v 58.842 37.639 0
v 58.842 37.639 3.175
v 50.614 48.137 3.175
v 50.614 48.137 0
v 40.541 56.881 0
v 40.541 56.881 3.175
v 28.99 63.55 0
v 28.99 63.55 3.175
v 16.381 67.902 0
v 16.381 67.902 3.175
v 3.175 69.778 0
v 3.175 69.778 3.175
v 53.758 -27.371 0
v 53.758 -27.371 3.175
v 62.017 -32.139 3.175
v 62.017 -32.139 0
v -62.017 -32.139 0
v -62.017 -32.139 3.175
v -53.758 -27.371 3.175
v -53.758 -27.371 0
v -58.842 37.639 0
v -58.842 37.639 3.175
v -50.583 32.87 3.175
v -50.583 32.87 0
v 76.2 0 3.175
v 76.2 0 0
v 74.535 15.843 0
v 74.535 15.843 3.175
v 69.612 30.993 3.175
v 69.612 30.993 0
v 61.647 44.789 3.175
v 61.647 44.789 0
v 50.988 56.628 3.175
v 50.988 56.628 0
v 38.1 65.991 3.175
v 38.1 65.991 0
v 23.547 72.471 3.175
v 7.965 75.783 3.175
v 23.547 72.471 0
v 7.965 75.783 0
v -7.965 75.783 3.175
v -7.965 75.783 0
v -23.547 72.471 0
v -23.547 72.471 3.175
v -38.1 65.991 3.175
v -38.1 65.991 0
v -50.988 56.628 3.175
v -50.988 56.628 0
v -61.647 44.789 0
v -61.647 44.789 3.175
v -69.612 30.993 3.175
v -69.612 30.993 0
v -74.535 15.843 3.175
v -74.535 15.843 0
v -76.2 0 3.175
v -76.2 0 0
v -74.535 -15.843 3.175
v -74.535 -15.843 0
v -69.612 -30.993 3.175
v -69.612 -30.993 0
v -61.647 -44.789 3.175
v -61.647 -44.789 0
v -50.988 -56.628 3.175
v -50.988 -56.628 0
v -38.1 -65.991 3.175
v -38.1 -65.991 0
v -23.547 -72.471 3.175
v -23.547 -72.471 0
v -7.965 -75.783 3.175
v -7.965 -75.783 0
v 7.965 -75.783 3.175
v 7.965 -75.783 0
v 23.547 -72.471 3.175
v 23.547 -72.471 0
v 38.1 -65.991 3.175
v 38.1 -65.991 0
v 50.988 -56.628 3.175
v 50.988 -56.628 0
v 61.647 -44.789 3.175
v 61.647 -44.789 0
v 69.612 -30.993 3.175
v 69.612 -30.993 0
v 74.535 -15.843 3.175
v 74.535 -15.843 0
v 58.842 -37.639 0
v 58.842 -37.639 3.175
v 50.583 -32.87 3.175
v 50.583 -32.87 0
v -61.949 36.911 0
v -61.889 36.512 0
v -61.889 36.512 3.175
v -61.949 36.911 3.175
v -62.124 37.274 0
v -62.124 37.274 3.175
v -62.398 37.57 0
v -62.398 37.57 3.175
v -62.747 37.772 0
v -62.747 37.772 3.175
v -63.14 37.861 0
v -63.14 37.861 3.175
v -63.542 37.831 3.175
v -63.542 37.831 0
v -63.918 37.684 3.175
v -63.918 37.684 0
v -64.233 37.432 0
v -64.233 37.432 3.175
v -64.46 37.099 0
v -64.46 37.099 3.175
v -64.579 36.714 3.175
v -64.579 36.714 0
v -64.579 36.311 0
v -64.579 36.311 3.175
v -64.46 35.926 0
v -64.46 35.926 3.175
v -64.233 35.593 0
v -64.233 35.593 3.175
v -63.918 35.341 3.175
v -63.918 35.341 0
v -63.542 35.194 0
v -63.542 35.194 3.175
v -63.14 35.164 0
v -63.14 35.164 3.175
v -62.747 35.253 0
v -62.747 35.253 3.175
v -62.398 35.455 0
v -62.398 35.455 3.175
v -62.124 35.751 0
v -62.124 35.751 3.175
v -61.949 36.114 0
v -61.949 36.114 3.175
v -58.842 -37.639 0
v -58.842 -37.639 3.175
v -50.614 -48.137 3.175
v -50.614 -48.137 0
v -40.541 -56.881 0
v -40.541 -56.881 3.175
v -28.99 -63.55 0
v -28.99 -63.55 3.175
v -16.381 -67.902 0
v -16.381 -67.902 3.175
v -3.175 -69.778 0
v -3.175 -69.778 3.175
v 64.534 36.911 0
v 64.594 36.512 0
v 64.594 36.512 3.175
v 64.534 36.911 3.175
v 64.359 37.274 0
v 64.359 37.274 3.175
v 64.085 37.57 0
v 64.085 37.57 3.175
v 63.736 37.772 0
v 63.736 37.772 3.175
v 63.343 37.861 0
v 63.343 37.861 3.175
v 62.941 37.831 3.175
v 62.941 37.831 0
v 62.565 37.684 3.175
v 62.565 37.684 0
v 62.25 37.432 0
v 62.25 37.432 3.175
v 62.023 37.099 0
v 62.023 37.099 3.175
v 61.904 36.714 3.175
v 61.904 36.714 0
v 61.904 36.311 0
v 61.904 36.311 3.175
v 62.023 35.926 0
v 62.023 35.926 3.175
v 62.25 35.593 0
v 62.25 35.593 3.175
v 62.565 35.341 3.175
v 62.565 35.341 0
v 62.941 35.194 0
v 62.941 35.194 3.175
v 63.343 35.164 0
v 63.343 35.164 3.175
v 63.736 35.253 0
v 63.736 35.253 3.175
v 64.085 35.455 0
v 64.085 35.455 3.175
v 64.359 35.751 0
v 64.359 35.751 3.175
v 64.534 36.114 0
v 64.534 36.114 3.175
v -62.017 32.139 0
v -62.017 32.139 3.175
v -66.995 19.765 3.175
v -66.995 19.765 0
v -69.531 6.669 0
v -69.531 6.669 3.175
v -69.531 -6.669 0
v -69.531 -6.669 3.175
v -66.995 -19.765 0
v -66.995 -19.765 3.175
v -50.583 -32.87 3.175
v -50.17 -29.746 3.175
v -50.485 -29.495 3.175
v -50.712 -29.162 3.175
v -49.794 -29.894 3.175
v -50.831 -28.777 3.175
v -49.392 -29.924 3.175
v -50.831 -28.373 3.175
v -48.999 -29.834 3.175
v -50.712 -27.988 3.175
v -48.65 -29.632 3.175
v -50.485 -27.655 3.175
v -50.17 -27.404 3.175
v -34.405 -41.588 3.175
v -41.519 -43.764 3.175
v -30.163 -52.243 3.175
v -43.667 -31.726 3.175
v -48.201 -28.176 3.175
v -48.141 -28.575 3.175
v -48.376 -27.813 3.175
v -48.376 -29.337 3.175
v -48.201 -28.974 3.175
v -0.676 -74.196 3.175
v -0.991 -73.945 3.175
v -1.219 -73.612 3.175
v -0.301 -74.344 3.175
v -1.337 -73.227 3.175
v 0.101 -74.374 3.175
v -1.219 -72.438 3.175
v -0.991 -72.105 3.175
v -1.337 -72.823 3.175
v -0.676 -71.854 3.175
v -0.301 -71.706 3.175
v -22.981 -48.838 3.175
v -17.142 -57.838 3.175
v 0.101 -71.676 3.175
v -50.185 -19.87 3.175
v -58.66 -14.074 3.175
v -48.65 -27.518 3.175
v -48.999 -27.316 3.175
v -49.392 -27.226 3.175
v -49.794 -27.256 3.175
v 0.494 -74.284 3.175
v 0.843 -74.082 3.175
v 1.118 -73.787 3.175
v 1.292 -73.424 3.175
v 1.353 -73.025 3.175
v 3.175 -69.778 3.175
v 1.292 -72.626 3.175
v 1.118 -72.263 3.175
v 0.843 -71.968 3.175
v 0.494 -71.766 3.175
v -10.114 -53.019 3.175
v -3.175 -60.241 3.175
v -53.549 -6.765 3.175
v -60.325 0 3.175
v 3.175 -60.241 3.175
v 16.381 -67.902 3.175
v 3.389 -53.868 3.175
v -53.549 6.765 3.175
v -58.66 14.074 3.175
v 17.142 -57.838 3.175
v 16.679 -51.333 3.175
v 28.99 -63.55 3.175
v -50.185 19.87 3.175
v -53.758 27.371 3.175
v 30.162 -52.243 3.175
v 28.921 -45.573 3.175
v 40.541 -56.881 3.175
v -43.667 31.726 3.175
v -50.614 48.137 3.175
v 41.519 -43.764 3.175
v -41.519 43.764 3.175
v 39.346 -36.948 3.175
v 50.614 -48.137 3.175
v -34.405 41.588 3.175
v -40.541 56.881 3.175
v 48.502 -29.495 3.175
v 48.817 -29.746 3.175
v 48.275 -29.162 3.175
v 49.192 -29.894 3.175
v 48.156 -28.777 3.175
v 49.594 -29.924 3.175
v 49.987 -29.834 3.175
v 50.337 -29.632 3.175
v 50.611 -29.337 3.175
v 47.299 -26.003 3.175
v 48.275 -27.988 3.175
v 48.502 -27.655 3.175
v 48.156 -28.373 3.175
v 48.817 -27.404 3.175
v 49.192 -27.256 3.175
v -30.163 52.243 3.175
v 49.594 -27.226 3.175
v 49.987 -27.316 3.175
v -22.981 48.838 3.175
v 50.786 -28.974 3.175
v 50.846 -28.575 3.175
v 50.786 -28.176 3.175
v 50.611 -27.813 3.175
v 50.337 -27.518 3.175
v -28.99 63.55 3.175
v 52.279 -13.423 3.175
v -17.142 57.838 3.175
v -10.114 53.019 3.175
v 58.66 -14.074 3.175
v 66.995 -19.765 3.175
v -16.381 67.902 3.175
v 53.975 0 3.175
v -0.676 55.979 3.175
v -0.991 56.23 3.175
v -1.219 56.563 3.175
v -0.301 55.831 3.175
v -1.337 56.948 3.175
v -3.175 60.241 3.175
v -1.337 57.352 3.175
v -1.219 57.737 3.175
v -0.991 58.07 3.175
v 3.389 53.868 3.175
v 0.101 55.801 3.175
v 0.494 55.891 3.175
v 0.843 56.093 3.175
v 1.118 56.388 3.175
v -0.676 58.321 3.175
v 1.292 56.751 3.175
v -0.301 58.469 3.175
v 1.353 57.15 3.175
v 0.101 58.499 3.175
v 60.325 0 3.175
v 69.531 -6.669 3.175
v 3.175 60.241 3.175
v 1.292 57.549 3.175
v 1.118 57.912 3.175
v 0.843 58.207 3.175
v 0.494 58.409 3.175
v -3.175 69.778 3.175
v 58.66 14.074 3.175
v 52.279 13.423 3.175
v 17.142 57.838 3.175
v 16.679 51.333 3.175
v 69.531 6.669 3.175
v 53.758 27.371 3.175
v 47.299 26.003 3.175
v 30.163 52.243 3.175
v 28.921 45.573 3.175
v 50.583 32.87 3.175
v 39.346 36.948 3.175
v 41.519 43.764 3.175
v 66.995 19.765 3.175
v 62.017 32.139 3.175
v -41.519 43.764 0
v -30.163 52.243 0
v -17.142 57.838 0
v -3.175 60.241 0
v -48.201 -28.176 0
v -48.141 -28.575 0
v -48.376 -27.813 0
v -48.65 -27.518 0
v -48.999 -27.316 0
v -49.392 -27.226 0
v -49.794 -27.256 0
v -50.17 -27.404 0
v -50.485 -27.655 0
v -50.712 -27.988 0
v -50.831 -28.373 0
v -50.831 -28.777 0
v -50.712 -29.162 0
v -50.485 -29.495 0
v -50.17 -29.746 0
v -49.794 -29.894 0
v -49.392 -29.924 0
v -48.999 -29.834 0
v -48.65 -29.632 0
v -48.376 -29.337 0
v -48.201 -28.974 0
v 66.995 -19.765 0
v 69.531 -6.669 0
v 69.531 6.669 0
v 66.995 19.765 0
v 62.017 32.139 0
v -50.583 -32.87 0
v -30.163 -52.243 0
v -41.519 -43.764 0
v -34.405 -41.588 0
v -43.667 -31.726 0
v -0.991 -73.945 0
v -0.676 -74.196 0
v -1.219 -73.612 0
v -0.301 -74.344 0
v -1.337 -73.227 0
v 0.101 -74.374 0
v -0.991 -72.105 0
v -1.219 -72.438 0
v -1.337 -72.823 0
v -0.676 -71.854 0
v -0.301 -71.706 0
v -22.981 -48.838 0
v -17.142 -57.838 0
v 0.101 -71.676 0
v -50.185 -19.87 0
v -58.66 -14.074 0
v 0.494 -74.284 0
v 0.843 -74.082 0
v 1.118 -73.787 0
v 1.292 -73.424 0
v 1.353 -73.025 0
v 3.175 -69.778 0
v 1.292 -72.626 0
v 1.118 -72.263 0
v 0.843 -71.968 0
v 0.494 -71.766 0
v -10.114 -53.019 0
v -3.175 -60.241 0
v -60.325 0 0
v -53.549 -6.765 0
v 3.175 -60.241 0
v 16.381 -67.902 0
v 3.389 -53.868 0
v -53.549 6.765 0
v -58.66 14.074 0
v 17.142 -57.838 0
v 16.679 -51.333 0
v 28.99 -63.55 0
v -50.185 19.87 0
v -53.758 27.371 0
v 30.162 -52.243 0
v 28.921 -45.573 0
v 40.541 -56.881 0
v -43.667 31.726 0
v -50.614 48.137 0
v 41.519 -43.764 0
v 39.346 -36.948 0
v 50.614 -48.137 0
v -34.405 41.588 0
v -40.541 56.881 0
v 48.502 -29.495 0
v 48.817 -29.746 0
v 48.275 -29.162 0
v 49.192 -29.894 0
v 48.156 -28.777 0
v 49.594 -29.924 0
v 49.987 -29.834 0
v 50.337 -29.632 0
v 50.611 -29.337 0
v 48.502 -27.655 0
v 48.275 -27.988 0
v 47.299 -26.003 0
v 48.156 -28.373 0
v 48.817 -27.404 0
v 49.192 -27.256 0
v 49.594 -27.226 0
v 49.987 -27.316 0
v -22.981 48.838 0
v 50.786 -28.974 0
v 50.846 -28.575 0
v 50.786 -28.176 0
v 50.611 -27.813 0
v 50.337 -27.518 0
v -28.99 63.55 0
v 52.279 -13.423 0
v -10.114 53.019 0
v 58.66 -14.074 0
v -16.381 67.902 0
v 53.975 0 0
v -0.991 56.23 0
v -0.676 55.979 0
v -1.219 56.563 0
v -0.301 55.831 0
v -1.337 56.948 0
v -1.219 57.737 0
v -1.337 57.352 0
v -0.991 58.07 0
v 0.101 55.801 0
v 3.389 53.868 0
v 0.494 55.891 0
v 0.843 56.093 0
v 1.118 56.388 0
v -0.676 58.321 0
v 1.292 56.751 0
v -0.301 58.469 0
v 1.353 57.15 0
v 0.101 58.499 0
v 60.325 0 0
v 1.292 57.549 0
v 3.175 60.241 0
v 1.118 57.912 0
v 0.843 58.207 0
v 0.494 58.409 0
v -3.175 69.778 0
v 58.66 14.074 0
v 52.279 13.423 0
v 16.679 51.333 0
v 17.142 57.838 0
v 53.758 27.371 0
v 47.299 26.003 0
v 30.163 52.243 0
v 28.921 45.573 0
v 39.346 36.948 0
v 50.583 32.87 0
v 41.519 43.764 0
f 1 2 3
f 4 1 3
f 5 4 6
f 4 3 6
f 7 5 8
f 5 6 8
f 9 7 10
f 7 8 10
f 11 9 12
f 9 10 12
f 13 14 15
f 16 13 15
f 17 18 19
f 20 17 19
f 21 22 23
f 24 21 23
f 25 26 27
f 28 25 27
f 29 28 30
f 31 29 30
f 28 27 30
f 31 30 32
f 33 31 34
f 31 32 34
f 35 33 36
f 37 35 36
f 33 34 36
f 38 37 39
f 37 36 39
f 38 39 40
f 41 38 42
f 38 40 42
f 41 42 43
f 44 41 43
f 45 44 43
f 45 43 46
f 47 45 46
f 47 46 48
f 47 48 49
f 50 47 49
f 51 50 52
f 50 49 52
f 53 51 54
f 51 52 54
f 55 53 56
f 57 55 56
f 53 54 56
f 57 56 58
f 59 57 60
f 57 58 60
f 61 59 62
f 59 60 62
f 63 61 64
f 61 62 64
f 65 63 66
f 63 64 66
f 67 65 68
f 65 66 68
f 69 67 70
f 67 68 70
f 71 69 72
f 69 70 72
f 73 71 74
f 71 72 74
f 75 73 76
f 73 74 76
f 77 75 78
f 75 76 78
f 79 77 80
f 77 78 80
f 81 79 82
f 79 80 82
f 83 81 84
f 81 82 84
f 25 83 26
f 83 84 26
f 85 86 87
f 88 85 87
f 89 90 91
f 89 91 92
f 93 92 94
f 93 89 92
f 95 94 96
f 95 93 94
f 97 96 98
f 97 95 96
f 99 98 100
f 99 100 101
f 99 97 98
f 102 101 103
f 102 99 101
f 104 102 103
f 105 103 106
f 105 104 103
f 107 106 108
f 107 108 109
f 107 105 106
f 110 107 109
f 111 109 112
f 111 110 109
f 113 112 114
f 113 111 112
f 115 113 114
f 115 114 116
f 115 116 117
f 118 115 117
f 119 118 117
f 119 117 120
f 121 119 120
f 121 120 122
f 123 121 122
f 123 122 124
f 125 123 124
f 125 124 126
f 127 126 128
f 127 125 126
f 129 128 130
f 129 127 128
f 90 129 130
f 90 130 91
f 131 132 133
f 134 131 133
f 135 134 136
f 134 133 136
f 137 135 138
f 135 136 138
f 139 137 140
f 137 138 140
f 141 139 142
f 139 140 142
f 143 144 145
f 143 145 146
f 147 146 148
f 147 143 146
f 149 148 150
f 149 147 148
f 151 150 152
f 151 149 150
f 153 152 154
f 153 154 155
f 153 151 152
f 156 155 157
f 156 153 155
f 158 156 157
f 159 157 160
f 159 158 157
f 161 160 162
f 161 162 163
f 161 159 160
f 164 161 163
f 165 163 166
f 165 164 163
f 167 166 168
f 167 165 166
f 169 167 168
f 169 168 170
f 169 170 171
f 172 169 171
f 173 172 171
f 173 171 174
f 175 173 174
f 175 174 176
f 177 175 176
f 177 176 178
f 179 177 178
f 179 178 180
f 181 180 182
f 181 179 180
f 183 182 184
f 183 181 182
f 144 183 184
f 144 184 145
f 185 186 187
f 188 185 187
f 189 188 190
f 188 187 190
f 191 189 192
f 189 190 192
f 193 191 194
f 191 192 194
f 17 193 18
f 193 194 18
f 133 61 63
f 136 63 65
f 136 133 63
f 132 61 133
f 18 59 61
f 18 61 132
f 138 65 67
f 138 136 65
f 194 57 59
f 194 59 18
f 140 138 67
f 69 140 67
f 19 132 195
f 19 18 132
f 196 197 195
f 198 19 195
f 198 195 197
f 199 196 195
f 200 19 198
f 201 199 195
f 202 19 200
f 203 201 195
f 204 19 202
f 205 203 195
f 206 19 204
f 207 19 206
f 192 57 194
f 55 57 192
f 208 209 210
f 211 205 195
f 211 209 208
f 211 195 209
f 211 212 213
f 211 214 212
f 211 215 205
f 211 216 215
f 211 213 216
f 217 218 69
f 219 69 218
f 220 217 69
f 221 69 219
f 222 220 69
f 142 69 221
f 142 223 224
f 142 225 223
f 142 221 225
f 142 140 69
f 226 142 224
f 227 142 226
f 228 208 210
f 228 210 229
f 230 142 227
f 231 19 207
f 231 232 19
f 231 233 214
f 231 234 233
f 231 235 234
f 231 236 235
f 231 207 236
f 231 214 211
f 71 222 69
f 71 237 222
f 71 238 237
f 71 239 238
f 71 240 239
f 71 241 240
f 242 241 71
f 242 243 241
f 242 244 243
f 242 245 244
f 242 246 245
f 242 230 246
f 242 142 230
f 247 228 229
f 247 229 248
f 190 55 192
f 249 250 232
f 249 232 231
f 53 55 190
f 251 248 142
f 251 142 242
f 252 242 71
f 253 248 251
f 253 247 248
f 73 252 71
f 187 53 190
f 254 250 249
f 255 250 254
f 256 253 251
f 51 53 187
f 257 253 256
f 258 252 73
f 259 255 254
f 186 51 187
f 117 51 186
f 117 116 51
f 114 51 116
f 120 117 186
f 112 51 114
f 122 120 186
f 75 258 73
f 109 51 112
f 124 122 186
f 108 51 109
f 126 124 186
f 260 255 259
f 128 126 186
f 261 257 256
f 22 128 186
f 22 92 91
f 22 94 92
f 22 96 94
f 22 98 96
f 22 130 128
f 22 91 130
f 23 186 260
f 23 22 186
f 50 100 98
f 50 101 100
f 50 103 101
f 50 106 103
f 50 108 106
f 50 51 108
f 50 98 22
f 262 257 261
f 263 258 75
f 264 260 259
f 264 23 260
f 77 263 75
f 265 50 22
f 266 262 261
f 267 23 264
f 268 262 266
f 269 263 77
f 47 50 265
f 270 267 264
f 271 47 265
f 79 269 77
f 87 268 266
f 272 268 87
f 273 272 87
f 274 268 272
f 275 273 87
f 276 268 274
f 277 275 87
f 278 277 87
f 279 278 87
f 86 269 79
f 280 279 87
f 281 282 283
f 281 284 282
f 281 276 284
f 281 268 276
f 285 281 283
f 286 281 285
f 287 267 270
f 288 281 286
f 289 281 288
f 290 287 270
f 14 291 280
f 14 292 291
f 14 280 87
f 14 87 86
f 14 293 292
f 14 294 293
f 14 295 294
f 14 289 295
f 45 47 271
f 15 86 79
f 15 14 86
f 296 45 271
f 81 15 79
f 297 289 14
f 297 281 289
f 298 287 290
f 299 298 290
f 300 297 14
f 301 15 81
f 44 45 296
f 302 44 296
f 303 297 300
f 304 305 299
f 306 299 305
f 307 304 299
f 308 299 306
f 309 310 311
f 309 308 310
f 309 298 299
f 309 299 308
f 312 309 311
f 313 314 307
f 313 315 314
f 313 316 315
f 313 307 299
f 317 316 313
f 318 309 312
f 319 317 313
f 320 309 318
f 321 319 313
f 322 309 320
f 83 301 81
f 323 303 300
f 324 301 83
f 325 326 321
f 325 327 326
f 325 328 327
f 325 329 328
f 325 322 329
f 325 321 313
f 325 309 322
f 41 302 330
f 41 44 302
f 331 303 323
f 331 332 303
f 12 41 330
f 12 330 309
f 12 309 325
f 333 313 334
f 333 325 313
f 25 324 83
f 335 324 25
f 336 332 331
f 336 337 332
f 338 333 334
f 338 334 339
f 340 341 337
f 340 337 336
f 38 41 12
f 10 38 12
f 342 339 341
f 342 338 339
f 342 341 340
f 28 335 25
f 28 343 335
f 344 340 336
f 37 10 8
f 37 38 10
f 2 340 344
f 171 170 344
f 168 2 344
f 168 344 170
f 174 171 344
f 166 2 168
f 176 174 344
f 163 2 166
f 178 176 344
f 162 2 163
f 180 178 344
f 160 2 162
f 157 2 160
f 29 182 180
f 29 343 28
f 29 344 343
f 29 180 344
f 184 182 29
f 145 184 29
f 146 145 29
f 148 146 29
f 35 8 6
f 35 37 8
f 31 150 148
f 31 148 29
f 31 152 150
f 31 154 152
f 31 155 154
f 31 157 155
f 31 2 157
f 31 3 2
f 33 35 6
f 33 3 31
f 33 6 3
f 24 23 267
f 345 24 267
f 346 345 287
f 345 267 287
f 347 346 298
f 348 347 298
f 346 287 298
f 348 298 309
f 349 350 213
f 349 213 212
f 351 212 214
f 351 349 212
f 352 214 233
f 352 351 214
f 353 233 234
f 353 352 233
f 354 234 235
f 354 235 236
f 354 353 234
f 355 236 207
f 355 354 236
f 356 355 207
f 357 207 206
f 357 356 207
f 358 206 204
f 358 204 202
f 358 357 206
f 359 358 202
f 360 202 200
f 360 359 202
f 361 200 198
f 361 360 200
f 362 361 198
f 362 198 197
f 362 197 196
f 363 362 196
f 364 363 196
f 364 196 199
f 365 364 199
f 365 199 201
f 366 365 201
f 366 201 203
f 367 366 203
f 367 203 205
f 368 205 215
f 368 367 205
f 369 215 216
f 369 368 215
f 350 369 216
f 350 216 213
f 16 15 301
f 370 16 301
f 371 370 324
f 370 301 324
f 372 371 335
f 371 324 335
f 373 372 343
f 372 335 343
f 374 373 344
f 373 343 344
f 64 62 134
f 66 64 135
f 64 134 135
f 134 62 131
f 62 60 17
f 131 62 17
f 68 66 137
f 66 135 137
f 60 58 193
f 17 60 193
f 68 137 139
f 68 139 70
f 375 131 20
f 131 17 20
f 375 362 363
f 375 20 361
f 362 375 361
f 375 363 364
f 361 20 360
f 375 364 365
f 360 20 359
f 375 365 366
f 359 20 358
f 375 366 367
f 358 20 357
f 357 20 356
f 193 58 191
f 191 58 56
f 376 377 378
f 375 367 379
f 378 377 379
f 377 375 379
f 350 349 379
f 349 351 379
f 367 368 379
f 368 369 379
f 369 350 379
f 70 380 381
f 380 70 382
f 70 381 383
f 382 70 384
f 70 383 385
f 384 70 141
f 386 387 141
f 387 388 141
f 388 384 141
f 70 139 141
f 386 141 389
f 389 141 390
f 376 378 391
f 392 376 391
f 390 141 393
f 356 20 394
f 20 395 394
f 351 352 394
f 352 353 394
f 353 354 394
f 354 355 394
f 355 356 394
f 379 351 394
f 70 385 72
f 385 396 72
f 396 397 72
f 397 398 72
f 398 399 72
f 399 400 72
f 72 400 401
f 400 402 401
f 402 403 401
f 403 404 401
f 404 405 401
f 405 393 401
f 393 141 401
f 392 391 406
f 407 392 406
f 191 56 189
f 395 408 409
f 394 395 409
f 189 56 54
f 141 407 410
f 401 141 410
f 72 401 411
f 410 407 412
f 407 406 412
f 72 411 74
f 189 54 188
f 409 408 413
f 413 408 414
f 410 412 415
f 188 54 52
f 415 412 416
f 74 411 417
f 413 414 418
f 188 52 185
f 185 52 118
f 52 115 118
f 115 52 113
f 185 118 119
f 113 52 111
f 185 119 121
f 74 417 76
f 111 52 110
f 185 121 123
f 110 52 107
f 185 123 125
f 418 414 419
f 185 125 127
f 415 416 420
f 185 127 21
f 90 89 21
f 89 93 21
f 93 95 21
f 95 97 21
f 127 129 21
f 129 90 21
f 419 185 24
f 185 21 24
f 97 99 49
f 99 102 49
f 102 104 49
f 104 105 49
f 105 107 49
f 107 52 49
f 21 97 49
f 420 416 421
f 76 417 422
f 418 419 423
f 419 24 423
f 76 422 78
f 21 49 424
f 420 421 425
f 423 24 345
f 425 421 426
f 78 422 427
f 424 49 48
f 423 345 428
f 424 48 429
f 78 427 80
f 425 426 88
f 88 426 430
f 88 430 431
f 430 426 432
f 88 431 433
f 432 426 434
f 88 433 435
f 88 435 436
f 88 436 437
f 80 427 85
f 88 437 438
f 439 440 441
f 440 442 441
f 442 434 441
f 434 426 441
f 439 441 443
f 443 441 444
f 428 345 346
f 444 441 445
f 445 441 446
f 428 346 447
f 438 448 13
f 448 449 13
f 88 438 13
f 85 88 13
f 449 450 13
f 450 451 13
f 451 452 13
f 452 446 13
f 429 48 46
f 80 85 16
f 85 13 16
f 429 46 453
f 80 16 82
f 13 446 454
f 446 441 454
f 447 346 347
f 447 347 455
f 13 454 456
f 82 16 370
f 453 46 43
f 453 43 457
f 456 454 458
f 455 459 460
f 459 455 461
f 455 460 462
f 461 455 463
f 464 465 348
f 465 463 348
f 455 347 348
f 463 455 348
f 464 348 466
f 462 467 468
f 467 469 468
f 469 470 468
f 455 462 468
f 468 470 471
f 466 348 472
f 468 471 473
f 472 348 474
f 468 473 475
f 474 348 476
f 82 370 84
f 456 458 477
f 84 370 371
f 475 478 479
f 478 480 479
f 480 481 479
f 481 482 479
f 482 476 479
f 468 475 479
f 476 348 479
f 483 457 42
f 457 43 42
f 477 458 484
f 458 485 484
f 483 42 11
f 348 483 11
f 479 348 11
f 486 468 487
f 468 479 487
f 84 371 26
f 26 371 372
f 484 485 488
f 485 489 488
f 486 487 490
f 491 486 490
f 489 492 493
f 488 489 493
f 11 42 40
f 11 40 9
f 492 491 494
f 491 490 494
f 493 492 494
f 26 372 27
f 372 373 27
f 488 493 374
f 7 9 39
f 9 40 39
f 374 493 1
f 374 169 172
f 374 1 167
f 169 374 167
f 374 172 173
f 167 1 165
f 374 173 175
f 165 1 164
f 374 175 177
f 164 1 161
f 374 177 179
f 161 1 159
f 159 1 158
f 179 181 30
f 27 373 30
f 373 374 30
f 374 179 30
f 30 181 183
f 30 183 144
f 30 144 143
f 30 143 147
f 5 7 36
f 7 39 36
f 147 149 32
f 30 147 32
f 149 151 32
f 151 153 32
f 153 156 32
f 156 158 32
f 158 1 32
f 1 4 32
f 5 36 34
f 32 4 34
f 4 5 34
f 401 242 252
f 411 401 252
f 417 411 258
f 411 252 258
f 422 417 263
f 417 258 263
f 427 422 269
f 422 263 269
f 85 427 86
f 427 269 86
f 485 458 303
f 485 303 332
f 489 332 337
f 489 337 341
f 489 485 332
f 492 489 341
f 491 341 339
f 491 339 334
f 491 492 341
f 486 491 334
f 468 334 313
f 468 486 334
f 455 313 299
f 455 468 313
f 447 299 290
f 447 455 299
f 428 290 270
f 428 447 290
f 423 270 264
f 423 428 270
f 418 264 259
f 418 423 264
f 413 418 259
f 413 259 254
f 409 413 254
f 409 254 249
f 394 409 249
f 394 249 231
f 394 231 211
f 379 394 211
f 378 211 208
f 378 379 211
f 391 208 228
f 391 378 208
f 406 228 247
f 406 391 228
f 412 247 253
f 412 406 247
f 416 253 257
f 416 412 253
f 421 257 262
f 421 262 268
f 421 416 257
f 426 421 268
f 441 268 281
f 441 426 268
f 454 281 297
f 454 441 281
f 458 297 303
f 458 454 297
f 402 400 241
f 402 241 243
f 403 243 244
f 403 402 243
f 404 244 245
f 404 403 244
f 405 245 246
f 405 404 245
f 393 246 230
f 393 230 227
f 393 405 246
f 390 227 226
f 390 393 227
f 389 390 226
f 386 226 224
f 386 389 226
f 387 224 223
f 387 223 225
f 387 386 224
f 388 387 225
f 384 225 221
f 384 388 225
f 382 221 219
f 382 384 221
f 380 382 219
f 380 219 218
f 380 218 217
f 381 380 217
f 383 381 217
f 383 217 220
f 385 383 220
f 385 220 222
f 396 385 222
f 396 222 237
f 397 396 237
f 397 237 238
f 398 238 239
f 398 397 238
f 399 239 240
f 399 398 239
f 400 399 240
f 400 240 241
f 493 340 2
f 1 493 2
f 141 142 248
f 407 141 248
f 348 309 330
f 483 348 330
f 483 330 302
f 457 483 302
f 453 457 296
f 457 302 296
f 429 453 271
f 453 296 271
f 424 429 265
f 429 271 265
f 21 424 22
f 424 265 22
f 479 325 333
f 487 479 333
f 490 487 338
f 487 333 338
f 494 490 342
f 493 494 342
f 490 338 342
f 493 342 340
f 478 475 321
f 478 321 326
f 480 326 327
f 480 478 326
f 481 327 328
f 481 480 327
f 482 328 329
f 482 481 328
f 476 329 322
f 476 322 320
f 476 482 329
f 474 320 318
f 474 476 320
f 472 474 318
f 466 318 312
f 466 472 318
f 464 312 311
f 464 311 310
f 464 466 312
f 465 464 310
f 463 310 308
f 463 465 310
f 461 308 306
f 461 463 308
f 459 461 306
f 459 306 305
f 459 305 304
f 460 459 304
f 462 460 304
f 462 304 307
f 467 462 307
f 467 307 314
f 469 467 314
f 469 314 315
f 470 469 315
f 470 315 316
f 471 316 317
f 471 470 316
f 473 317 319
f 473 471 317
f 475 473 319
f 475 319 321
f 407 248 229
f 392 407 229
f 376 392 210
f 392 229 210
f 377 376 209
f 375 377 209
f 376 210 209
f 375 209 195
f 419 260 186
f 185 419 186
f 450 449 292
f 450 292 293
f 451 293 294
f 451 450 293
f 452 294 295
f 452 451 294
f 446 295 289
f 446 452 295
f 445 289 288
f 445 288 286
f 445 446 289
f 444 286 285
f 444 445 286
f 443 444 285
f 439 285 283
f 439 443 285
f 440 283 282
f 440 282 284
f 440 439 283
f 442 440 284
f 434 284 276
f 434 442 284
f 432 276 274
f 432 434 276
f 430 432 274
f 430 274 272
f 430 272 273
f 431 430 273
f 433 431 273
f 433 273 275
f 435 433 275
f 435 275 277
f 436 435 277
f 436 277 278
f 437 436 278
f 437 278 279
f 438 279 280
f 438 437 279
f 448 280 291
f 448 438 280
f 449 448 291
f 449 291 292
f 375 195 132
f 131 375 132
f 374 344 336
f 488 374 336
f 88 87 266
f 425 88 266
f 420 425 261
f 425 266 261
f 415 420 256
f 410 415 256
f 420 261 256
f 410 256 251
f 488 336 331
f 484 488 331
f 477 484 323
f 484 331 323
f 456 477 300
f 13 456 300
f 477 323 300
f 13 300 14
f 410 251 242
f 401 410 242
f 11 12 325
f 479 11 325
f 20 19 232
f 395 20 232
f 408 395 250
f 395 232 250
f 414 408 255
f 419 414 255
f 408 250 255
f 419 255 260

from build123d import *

# Parameters (mm, degrees)
F0_R            = 76.2
F0_R_2          = 1.35255
F0_R_3          = 53.975
F1_DEPTH        = 3.175
F3_DEPTH        = 3.175
F3_COPIES_COUNT = 6


# Not quite as in the source:
# - a pattern or mirror of a feature is missing from the dataset's text; its kind, count and spacing are read off the source's solid


with BuildPart() as f1:
    # F0 (on Top) → F1 (new body)
    with BuildSketch(Plane.XY):
        Circle(F0_R)
        with Locations((-49.4933518263, -28.575)):
            Circle(F0_R_2, mode=Mode.SUBTRACT)
        with Locations((0, -73.025)):
            Circle(F0_R_2, mode=Mode.SUBTRACT)
        with Locations((49.4933518263, -28.575)):
            Circle(F0_R_2, mode=Mode.SUBTRACT)
        with Locations((-63.2415051114, 36.5125)):
            Circle(F0_R_2, mode=Mode.SUBTRACT)
        Circle(F0_R_3, mode=Mode.SUBTRACT)
        with Locations((63.2415051114, 36.5125)):
            Circle(F0_R_2, mode=Mode.SUBTRACT)
        with Locations((0, 57.15)):
            Circle(F0_R_2, mode=Mode.SUBTRACT)
    extrude(amount=F1_DEPTH)

    # F2 (on face) → F3 (cut, through all)
    with BuildSketch(Plane.XY.offset(3.175)):
        with BuildLine():
            ThreePointArc((-53.7580736024, -27.3710640561), (-60.325, 0), (-53.7580736024, 27.3710640561))
            Line((-53.7580736024, 27.3710640561), (-62.0168505364, 32.1392711421))
            ThreePointArc((-62.0168505364, 32.1392711421), (-69.85, 0), (-62.0168505364, -32.1392711421))
            Line((-62.0168505364, -32.1392711421), (-53.7580736024, -27.3710640561))
        make_face()
    f3 = extrude(amount=-F3_DEPTH, mode=Mode.SUBTRACT)

    # F3_copies: F3 ×6 about axis
    f3_copies_axis = Axis((0, 0, 0), (0, 0, 1))
    for i in range(1, F3_COPIES_COUNT):
        add(f3.rotate(f3_copies_axis, i * 360 / F3_COPIES_COUNT), mode=Mode.SUBTRACT)


solid = f1.part
